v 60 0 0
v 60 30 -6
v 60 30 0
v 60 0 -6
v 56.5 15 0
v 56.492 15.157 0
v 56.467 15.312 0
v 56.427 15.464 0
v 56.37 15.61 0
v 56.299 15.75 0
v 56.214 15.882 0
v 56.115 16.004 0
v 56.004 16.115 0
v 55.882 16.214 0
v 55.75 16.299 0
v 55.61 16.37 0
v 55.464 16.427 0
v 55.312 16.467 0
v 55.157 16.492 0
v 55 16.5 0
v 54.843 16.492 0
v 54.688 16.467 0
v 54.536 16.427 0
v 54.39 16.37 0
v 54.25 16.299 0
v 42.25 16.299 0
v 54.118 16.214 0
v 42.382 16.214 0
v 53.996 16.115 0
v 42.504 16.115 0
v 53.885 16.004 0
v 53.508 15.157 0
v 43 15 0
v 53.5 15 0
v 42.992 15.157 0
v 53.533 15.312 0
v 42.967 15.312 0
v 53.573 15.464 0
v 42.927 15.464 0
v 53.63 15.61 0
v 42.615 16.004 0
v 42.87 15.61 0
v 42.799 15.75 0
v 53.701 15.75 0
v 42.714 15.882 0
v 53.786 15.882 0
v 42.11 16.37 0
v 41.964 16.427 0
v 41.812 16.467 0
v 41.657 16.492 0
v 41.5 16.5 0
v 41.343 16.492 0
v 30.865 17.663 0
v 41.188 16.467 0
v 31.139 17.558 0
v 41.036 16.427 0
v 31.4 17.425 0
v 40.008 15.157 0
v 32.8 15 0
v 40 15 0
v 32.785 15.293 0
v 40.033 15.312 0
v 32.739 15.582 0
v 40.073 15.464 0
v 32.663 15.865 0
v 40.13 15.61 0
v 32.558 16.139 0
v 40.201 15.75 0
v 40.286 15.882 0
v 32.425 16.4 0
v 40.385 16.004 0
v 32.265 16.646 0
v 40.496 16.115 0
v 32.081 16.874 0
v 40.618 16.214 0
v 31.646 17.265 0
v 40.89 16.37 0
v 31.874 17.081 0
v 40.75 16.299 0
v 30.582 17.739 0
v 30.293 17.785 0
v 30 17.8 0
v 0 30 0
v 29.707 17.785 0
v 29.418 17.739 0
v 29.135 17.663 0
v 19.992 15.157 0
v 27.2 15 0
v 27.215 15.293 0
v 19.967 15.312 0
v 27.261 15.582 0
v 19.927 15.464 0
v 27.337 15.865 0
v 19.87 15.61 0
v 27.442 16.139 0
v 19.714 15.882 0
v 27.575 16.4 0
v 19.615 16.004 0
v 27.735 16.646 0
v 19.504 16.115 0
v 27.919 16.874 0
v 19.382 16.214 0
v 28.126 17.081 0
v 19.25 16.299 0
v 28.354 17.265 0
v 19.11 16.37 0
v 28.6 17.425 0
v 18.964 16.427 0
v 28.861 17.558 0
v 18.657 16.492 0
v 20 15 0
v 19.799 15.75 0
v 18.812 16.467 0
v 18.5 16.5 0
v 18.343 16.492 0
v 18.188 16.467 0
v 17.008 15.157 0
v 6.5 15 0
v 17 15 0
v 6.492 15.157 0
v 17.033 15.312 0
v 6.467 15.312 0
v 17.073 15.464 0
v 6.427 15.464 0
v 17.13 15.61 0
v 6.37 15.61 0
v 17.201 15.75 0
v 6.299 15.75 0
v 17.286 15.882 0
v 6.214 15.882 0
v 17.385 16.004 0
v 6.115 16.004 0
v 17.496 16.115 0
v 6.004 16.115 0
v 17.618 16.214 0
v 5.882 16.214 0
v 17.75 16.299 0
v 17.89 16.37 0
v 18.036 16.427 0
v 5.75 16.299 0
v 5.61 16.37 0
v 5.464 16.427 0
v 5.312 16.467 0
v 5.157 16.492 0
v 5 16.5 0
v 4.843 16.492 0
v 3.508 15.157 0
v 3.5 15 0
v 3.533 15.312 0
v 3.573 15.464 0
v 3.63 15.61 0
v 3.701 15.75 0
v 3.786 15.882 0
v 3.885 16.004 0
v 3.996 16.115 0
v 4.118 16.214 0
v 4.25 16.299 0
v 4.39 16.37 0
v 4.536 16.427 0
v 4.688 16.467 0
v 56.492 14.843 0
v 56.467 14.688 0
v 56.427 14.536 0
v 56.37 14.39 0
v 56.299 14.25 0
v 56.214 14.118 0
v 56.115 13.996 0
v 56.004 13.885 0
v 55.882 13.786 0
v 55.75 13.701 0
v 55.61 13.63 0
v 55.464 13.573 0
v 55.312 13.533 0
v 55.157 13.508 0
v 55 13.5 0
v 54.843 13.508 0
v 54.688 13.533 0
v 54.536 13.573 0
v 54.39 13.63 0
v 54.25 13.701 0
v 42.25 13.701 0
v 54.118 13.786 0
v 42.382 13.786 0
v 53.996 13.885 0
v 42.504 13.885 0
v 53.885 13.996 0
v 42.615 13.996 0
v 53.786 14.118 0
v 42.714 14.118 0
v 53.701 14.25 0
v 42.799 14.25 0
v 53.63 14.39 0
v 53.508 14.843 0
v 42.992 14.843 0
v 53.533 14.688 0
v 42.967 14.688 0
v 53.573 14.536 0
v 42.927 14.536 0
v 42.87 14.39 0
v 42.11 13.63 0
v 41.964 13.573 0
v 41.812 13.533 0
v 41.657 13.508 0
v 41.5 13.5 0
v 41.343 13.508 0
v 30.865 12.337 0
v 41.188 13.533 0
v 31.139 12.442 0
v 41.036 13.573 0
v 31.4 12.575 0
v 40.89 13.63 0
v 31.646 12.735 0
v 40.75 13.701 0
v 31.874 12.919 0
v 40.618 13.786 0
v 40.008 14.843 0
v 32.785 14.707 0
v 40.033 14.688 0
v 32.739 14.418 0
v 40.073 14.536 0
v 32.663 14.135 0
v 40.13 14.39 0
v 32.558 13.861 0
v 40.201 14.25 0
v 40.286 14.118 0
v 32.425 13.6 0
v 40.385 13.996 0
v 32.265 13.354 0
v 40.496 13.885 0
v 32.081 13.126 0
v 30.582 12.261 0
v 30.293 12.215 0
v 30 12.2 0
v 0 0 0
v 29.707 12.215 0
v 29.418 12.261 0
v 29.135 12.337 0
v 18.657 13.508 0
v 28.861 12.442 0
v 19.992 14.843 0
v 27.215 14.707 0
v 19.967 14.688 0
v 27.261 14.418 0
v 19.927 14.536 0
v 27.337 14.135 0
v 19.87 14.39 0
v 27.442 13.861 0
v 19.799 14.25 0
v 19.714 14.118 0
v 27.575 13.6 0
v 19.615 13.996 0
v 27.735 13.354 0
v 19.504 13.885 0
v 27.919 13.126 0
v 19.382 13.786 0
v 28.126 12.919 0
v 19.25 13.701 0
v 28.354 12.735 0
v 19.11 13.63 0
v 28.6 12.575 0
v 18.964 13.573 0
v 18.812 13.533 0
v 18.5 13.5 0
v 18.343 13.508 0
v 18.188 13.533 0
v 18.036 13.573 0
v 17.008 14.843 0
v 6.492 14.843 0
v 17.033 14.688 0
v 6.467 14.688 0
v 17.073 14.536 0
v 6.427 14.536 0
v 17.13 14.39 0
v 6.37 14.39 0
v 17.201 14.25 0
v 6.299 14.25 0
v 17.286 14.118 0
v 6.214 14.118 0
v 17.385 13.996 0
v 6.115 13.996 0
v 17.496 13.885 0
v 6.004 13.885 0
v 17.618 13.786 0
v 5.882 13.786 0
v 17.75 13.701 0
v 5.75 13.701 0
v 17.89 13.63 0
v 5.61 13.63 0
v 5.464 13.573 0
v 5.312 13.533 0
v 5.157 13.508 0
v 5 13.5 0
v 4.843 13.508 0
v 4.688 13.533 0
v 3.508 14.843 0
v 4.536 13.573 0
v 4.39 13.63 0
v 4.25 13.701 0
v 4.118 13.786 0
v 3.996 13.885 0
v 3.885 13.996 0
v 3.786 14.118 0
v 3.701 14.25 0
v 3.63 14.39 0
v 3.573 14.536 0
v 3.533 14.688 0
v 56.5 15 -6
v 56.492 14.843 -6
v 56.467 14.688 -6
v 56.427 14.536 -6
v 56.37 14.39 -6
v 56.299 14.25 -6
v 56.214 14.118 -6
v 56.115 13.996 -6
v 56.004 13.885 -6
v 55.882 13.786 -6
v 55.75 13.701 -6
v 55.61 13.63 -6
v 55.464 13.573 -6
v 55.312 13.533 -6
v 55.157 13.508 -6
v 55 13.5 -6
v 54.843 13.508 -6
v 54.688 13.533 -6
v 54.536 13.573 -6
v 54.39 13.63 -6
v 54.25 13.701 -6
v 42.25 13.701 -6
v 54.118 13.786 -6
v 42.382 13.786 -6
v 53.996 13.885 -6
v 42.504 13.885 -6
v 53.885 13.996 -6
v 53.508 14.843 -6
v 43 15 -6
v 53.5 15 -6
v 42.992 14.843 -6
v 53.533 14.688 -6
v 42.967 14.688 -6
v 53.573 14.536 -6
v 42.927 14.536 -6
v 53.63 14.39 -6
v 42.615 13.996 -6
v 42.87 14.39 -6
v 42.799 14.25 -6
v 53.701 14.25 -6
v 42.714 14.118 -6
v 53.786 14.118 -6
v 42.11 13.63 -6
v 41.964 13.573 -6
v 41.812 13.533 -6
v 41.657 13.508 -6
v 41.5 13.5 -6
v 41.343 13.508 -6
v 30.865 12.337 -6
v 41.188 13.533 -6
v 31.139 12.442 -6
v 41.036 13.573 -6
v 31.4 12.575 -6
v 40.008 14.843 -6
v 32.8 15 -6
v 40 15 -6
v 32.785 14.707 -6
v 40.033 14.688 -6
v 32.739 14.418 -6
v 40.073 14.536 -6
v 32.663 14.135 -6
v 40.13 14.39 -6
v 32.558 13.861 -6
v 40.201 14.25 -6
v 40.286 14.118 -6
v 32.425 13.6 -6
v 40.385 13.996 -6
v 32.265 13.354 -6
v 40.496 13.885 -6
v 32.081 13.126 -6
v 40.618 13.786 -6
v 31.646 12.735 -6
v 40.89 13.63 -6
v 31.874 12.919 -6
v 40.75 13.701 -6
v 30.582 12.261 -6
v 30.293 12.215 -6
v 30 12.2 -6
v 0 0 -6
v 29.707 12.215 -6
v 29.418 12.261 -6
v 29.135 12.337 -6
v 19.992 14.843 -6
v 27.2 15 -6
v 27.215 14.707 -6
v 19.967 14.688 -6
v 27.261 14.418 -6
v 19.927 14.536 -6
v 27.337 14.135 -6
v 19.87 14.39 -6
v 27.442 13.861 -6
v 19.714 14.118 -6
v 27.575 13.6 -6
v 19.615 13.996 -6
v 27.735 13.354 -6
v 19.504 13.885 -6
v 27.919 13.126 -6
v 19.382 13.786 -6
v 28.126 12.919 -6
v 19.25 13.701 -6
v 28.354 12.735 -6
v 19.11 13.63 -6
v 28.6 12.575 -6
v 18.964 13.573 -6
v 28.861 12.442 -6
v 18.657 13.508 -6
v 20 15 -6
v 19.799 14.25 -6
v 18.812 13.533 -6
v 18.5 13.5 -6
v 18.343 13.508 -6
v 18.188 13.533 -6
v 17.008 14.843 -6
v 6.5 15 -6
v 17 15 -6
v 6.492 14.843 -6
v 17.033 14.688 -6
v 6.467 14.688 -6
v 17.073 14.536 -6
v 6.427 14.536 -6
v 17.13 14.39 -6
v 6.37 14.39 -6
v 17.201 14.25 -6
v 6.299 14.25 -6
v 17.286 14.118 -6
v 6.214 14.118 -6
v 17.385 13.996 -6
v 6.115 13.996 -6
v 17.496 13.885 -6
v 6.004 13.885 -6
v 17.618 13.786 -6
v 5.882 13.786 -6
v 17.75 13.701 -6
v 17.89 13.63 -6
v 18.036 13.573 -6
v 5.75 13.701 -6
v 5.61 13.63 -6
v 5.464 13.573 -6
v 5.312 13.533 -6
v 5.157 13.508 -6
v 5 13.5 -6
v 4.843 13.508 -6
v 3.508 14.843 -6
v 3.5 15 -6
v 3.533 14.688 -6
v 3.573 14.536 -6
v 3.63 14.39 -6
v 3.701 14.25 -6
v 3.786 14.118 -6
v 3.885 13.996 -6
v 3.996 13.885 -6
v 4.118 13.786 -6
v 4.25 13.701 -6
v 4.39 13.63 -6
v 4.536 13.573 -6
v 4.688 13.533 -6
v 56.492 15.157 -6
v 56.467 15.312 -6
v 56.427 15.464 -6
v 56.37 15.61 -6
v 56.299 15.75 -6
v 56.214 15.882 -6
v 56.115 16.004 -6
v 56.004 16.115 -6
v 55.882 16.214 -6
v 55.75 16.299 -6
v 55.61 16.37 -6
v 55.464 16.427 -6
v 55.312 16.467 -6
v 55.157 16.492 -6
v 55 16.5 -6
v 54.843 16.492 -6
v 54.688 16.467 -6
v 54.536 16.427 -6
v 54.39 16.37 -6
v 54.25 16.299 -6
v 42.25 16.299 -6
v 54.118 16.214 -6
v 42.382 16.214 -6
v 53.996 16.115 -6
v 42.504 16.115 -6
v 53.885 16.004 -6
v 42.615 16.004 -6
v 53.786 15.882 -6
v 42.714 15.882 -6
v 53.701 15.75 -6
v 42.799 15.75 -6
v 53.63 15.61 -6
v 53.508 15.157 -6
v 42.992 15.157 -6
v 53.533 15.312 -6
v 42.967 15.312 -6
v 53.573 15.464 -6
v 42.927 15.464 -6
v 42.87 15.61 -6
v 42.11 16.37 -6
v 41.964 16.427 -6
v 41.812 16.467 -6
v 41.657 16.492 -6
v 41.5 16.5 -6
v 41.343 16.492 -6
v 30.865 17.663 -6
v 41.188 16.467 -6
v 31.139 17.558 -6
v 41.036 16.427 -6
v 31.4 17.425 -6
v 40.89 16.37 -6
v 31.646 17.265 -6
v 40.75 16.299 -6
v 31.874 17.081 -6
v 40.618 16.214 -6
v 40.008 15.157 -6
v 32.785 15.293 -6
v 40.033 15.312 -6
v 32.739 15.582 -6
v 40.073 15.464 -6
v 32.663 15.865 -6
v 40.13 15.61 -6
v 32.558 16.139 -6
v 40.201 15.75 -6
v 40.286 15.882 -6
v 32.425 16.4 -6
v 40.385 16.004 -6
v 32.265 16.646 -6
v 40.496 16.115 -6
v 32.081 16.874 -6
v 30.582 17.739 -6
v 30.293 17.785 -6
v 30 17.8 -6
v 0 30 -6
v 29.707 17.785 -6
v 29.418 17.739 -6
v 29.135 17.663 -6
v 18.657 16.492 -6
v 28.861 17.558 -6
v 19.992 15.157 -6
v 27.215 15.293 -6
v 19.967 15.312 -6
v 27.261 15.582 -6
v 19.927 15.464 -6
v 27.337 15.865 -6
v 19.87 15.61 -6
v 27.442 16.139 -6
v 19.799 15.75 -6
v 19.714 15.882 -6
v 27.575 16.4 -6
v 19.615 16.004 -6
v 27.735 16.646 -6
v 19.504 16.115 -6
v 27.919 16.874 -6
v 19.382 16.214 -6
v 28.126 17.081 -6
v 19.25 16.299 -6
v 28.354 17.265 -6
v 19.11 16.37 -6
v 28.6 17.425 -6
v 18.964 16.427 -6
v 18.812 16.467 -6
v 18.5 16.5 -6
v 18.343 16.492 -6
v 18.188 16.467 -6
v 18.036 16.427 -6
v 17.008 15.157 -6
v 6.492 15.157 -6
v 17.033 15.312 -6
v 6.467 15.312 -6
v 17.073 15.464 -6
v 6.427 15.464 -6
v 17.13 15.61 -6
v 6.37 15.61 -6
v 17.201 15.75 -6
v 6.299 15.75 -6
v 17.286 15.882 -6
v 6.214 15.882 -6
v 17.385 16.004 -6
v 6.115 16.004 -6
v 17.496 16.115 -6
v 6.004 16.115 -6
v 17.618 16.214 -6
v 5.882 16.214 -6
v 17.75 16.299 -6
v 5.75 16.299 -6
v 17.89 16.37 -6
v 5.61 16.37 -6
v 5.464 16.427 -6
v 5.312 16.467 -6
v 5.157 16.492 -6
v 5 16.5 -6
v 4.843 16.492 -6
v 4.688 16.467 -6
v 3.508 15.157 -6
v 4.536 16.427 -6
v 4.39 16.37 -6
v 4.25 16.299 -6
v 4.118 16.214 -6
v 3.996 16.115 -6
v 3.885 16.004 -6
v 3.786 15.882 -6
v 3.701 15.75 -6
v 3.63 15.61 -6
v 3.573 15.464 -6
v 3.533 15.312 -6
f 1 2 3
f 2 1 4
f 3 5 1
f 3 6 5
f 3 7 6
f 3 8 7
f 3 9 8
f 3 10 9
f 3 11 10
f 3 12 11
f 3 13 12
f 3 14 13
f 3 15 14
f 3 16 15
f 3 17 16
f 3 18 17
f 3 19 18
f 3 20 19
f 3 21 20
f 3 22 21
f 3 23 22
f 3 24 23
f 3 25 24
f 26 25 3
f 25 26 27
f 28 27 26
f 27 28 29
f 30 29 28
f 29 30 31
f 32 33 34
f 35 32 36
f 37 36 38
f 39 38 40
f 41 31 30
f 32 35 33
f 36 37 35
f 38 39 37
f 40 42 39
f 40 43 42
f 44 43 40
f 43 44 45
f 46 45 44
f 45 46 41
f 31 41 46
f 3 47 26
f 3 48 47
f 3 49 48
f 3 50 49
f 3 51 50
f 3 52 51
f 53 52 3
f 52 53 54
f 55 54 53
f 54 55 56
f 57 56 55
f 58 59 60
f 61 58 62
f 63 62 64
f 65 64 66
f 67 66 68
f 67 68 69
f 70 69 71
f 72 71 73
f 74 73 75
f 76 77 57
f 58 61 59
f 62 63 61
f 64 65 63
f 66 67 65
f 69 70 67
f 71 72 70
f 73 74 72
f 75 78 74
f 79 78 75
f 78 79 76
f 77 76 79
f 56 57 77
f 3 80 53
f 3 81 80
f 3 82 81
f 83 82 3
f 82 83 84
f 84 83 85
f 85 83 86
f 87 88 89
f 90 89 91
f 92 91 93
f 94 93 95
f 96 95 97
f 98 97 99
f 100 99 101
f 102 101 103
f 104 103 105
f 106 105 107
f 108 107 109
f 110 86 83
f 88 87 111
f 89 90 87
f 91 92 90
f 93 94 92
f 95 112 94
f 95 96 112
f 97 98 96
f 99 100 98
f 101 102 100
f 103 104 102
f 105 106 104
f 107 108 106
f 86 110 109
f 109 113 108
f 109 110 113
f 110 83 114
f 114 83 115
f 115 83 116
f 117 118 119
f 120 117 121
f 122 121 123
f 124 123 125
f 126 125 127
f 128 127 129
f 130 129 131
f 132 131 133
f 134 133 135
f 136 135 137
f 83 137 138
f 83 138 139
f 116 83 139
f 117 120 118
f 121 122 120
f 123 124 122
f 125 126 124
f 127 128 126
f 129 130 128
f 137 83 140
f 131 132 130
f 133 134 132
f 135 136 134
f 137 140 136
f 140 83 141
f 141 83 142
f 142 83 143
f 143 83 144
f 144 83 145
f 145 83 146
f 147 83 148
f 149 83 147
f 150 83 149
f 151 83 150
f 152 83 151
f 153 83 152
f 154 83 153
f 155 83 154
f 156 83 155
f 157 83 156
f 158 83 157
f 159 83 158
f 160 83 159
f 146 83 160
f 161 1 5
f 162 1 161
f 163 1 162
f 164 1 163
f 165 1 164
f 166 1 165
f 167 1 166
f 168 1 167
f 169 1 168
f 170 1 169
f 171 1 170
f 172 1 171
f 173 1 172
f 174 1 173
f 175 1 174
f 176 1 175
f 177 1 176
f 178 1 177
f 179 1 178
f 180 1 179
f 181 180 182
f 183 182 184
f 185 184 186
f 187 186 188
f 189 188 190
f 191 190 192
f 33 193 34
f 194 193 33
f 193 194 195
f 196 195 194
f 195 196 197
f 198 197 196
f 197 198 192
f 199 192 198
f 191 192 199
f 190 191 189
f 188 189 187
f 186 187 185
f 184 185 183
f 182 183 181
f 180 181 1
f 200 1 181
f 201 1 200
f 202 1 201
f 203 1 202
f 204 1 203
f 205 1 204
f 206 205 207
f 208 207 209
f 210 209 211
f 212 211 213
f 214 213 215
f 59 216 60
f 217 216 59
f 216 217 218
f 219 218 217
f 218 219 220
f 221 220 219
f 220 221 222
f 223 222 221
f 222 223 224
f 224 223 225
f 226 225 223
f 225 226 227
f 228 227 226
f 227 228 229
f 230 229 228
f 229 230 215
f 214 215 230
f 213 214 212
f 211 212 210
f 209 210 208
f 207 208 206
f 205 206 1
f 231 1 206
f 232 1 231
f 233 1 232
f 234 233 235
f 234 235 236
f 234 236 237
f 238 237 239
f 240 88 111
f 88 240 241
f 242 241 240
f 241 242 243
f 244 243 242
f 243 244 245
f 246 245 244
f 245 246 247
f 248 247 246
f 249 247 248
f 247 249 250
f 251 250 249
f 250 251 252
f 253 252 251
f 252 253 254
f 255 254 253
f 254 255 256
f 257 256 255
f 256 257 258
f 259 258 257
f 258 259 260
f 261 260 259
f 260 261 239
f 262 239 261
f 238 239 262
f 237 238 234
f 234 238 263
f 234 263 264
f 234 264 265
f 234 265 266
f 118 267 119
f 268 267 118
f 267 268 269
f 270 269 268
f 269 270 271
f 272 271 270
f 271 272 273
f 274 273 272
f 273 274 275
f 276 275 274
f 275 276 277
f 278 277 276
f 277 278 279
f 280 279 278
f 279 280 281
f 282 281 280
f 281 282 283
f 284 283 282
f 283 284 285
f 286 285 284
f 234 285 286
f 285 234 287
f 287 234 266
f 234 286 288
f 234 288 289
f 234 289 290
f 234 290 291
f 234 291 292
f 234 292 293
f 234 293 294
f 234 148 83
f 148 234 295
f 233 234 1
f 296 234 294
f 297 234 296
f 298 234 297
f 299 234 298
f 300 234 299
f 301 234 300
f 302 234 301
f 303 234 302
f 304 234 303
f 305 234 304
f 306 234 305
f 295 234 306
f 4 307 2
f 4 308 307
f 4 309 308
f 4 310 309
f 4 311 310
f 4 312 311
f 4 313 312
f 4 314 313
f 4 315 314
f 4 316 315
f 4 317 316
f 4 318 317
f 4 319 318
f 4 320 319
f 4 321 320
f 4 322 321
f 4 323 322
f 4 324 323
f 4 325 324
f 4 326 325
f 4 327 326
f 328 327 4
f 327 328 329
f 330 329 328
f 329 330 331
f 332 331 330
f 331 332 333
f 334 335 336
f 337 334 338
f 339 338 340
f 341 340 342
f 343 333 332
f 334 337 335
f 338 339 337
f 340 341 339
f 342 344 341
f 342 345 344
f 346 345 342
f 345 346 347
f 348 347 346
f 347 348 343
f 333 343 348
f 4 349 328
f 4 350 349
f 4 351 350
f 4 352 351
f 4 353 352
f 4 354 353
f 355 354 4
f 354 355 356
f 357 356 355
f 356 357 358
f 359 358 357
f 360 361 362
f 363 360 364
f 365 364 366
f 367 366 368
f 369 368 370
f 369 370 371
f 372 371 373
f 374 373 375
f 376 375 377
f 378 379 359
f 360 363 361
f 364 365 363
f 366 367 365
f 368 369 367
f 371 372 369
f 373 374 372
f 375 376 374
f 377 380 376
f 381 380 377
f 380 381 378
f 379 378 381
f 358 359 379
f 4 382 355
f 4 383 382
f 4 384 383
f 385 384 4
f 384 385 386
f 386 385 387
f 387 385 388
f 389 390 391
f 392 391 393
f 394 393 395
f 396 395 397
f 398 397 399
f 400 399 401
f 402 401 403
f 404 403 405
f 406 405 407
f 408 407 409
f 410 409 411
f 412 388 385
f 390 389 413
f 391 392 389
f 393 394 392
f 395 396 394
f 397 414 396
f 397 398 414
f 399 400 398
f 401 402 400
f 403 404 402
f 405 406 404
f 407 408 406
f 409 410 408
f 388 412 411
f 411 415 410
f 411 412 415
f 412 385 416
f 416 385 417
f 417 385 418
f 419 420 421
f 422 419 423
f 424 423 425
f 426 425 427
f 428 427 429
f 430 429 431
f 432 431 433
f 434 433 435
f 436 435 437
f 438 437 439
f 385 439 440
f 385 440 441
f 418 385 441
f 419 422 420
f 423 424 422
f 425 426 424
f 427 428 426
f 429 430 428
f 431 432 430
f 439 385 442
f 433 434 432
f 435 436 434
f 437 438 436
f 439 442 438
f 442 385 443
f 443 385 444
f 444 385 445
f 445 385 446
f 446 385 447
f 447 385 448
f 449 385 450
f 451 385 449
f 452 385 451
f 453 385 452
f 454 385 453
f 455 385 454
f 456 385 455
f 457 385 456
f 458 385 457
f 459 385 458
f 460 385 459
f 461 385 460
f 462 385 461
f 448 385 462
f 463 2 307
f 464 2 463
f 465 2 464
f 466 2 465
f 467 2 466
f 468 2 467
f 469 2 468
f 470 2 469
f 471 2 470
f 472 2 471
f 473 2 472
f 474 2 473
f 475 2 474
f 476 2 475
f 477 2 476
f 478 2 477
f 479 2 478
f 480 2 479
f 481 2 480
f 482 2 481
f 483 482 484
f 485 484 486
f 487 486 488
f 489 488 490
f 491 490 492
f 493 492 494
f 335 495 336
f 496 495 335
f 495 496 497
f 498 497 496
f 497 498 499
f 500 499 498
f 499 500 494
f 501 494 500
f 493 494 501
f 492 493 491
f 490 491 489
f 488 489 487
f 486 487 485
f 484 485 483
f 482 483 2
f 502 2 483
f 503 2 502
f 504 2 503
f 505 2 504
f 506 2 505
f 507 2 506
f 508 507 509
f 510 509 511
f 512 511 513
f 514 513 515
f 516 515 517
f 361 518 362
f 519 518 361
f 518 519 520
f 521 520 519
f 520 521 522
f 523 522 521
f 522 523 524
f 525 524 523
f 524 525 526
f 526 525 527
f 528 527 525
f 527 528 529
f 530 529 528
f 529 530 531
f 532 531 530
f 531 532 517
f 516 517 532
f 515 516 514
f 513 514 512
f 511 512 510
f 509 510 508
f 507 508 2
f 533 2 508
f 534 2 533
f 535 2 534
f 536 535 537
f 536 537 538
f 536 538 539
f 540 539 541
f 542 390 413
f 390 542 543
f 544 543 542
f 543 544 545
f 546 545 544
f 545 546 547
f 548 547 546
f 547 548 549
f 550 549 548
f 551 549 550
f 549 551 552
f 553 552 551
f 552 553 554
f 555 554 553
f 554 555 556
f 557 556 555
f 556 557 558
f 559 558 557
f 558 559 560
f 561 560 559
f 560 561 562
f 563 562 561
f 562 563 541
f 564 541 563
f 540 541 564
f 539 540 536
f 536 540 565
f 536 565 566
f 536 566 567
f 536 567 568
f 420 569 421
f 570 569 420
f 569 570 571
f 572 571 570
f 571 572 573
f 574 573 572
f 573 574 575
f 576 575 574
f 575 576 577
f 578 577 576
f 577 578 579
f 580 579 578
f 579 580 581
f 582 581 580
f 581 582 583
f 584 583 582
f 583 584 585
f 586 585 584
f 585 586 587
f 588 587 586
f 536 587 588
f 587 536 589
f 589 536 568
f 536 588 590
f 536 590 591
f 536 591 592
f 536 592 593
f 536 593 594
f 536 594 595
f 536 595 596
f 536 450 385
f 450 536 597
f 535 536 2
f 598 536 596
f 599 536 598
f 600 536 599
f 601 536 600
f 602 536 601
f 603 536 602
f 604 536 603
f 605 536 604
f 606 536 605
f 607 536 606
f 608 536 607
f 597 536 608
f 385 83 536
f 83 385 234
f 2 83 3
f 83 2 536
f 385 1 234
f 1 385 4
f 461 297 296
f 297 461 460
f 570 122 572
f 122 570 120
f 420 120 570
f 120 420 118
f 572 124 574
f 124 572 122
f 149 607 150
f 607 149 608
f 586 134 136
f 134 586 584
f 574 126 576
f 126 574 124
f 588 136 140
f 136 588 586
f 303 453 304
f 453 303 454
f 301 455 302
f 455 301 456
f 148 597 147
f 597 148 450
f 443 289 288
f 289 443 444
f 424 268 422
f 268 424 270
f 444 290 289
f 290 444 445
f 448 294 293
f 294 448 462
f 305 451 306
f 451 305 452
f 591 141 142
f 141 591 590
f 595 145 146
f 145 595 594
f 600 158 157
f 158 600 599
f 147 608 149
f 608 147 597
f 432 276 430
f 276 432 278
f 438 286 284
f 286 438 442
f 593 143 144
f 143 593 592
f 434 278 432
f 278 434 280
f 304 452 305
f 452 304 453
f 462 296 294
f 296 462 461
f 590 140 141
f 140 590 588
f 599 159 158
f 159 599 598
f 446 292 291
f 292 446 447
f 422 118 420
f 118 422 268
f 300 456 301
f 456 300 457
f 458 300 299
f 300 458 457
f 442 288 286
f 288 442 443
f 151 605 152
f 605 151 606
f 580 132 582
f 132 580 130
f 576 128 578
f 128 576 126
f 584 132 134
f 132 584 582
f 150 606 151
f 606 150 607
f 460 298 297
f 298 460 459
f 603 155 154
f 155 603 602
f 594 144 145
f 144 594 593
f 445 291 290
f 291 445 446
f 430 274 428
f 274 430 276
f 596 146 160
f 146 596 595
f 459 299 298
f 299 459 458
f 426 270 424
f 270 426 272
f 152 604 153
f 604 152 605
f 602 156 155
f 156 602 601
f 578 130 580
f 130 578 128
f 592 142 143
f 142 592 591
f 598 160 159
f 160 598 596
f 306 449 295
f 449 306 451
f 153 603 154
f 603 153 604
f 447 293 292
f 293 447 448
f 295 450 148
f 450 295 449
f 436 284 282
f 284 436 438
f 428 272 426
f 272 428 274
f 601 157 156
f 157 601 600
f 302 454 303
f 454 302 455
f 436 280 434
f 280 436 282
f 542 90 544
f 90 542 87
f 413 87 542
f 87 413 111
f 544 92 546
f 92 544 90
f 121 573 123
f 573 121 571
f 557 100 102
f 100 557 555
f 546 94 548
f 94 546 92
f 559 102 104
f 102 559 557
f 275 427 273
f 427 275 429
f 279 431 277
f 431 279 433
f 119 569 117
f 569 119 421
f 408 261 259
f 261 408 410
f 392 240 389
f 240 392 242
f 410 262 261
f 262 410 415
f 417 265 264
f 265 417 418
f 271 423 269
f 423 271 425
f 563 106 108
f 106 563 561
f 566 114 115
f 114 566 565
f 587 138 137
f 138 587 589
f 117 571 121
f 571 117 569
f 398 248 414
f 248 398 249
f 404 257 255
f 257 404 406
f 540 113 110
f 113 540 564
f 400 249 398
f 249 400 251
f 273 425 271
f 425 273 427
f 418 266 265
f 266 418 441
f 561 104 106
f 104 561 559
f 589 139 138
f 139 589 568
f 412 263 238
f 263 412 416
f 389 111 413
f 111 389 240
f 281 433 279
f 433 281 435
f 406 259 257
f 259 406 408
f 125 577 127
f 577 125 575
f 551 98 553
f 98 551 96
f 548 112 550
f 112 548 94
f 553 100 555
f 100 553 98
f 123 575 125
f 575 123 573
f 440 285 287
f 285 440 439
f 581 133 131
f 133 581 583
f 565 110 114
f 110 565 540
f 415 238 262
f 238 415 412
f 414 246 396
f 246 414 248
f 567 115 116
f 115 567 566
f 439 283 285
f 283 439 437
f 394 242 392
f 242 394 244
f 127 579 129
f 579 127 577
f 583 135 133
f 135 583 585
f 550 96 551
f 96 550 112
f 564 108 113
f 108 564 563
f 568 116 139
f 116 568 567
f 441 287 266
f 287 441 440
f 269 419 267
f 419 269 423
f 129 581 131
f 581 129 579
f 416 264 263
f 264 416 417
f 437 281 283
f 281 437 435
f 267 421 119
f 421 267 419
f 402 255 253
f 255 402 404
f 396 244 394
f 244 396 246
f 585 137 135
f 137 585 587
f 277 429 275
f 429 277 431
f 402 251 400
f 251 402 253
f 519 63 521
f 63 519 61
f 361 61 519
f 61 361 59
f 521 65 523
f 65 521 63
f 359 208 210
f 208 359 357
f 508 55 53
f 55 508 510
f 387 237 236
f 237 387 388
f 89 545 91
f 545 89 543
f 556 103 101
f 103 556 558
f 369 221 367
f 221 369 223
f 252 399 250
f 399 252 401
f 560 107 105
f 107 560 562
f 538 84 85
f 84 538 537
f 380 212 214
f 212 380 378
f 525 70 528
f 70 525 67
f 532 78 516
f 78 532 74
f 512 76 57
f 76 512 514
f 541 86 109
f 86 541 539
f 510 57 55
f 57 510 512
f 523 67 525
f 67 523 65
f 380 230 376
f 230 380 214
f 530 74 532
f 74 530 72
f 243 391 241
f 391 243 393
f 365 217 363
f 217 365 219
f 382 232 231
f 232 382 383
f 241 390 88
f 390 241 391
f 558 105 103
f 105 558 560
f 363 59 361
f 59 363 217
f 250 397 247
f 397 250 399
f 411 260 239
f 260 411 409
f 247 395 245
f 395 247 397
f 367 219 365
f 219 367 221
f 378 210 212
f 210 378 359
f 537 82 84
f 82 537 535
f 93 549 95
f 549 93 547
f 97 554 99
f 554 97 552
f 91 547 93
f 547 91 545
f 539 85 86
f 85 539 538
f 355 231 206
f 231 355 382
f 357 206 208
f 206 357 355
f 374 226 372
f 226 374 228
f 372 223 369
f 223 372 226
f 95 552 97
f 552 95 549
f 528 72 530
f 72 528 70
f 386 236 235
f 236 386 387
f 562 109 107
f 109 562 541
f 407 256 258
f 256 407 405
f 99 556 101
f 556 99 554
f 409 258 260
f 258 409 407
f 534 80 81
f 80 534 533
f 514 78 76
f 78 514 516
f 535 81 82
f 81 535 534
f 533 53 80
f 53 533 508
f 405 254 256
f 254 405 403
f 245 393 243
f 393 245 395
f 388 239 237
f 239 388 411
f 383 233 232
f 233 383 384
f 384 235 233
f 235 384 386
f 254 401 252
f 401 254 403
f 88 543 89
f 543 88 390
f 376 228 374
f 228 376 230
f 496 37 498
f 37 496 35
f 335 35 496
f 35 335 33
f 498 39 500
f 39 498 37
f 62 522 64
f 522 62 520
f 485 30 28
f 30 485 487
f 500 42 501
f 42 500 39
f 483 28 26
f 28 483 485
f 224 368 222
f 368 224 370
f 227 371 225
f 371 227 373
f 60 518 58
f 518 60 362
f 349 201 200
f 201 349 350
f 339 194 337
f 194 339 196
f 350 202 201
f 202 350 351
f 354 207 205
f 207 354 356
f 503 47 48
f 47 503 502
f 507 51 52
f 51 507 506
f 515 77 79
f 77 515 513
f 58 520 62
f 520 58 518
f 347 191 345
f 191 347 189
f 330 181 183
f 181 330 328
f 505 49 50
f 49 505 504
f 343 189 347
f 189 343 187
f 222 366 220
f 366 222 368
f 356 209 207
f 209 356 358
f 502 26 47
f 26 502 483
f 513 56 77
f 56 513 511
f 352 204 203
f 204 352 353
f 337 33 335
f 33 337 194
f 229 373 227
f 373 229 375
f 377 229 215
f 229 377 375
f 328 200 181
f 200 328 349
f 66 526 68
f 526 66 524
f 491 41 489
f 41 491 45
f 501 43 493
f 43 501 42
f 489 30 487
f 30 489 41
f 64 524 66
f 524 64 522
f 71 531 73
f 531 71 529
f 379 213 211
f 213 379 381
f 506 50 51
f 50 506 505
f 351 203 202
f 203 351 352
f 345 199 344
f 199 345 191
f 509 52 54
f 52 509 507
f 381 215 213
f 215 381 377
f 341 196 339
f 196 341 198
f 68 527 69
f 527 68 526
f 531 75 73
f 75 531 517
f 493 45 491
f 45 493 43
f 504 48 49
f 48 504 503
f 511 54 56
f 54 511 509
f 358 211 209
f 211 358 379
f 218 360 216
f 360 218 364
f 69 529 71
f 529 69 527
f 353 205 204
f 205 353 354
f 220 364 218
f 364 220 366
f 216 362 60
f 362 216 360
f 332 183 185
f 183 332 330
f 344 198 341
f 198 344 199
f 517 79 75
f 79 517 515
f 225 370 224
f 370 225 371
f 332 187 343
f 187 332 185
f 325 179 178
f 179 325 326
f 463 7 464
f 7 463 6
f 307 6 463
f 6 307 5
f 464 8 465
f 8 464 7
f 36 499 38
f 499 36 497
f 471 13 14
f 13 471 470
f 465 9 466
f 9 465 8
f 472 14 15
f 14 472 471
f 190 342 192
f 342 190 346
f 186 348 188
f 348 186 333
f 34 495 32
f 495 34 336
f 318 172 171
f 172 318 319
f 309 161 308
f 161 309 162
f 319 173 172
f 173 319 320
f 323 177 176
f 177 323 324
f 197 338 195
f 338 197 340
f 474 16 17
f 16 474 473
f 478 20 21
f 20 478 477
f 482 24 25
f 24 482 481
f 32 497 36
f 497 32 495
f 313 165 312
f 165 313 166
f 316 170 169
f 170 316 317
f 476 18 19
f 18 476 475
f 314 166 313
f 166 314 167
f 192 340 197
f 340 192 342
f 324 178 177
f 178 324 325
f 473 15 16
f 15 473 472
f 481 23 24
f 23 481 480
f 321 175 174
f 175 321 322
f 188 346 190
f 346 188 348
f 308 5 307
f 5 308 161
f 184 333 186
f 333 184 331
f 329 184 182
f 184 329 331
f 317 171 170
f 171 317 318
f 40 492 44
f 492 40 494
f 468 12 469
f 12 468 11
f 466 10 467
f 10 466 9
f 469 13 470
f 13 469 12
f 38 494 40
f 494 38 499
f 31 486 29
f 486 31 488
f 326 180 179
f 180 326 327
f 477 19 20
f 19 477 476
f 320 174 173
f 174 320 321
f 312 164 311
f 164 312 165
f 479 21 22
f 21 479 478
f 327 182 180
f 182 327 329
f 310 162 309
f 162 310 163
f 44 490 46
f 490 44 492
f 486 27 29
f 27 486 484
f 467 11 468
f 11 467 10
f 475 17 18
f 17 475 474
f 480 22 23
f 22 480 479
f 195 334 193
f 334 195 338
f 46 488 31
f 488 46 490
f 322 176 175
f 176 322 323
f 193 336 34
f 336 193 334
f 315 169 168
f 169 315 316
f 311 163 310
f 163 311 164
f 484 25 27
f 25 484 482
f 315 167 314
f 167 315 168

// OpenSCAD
/*
 * hotend mount
 *
 * NOTE: This needs to be milled out of a rigid heat resistant material.
 * It is tested with MDF.
 *
 * Mount for hotend_direct_bowden.scad
 *
 * Copyright 2012 <b@Zi.iS>
 * License CC BY 3.0
 */
$fn=60;

translate([
	0,
	0,
	-6
]) {
	difference() {
		cube([
			60,
			30,
			6
		]);
		translate([
			5,
			15,
			0
		]) {
			cylinder(
				r=3/2,
				h=7
			);
		}
		translate([
			30-11.5,
			15,
			0
		]) {
			cylinder(
				r=3/2,
				h=7
			);
		}
		translate([
			30,
			15,
			0
		]) {
			cylinder(
				r=5.6/2,
				h=7
			);
		}
		translate([
			30+11.5,
			15,
			0
		]) {
			cylinder(
				r=3/2,
				h=7
			);
		}
		translate([
			55,
			15,
			0
		]) {
			cylinder(
				r=3/2,
				h=7
			);
		}
	}
}
	
	
